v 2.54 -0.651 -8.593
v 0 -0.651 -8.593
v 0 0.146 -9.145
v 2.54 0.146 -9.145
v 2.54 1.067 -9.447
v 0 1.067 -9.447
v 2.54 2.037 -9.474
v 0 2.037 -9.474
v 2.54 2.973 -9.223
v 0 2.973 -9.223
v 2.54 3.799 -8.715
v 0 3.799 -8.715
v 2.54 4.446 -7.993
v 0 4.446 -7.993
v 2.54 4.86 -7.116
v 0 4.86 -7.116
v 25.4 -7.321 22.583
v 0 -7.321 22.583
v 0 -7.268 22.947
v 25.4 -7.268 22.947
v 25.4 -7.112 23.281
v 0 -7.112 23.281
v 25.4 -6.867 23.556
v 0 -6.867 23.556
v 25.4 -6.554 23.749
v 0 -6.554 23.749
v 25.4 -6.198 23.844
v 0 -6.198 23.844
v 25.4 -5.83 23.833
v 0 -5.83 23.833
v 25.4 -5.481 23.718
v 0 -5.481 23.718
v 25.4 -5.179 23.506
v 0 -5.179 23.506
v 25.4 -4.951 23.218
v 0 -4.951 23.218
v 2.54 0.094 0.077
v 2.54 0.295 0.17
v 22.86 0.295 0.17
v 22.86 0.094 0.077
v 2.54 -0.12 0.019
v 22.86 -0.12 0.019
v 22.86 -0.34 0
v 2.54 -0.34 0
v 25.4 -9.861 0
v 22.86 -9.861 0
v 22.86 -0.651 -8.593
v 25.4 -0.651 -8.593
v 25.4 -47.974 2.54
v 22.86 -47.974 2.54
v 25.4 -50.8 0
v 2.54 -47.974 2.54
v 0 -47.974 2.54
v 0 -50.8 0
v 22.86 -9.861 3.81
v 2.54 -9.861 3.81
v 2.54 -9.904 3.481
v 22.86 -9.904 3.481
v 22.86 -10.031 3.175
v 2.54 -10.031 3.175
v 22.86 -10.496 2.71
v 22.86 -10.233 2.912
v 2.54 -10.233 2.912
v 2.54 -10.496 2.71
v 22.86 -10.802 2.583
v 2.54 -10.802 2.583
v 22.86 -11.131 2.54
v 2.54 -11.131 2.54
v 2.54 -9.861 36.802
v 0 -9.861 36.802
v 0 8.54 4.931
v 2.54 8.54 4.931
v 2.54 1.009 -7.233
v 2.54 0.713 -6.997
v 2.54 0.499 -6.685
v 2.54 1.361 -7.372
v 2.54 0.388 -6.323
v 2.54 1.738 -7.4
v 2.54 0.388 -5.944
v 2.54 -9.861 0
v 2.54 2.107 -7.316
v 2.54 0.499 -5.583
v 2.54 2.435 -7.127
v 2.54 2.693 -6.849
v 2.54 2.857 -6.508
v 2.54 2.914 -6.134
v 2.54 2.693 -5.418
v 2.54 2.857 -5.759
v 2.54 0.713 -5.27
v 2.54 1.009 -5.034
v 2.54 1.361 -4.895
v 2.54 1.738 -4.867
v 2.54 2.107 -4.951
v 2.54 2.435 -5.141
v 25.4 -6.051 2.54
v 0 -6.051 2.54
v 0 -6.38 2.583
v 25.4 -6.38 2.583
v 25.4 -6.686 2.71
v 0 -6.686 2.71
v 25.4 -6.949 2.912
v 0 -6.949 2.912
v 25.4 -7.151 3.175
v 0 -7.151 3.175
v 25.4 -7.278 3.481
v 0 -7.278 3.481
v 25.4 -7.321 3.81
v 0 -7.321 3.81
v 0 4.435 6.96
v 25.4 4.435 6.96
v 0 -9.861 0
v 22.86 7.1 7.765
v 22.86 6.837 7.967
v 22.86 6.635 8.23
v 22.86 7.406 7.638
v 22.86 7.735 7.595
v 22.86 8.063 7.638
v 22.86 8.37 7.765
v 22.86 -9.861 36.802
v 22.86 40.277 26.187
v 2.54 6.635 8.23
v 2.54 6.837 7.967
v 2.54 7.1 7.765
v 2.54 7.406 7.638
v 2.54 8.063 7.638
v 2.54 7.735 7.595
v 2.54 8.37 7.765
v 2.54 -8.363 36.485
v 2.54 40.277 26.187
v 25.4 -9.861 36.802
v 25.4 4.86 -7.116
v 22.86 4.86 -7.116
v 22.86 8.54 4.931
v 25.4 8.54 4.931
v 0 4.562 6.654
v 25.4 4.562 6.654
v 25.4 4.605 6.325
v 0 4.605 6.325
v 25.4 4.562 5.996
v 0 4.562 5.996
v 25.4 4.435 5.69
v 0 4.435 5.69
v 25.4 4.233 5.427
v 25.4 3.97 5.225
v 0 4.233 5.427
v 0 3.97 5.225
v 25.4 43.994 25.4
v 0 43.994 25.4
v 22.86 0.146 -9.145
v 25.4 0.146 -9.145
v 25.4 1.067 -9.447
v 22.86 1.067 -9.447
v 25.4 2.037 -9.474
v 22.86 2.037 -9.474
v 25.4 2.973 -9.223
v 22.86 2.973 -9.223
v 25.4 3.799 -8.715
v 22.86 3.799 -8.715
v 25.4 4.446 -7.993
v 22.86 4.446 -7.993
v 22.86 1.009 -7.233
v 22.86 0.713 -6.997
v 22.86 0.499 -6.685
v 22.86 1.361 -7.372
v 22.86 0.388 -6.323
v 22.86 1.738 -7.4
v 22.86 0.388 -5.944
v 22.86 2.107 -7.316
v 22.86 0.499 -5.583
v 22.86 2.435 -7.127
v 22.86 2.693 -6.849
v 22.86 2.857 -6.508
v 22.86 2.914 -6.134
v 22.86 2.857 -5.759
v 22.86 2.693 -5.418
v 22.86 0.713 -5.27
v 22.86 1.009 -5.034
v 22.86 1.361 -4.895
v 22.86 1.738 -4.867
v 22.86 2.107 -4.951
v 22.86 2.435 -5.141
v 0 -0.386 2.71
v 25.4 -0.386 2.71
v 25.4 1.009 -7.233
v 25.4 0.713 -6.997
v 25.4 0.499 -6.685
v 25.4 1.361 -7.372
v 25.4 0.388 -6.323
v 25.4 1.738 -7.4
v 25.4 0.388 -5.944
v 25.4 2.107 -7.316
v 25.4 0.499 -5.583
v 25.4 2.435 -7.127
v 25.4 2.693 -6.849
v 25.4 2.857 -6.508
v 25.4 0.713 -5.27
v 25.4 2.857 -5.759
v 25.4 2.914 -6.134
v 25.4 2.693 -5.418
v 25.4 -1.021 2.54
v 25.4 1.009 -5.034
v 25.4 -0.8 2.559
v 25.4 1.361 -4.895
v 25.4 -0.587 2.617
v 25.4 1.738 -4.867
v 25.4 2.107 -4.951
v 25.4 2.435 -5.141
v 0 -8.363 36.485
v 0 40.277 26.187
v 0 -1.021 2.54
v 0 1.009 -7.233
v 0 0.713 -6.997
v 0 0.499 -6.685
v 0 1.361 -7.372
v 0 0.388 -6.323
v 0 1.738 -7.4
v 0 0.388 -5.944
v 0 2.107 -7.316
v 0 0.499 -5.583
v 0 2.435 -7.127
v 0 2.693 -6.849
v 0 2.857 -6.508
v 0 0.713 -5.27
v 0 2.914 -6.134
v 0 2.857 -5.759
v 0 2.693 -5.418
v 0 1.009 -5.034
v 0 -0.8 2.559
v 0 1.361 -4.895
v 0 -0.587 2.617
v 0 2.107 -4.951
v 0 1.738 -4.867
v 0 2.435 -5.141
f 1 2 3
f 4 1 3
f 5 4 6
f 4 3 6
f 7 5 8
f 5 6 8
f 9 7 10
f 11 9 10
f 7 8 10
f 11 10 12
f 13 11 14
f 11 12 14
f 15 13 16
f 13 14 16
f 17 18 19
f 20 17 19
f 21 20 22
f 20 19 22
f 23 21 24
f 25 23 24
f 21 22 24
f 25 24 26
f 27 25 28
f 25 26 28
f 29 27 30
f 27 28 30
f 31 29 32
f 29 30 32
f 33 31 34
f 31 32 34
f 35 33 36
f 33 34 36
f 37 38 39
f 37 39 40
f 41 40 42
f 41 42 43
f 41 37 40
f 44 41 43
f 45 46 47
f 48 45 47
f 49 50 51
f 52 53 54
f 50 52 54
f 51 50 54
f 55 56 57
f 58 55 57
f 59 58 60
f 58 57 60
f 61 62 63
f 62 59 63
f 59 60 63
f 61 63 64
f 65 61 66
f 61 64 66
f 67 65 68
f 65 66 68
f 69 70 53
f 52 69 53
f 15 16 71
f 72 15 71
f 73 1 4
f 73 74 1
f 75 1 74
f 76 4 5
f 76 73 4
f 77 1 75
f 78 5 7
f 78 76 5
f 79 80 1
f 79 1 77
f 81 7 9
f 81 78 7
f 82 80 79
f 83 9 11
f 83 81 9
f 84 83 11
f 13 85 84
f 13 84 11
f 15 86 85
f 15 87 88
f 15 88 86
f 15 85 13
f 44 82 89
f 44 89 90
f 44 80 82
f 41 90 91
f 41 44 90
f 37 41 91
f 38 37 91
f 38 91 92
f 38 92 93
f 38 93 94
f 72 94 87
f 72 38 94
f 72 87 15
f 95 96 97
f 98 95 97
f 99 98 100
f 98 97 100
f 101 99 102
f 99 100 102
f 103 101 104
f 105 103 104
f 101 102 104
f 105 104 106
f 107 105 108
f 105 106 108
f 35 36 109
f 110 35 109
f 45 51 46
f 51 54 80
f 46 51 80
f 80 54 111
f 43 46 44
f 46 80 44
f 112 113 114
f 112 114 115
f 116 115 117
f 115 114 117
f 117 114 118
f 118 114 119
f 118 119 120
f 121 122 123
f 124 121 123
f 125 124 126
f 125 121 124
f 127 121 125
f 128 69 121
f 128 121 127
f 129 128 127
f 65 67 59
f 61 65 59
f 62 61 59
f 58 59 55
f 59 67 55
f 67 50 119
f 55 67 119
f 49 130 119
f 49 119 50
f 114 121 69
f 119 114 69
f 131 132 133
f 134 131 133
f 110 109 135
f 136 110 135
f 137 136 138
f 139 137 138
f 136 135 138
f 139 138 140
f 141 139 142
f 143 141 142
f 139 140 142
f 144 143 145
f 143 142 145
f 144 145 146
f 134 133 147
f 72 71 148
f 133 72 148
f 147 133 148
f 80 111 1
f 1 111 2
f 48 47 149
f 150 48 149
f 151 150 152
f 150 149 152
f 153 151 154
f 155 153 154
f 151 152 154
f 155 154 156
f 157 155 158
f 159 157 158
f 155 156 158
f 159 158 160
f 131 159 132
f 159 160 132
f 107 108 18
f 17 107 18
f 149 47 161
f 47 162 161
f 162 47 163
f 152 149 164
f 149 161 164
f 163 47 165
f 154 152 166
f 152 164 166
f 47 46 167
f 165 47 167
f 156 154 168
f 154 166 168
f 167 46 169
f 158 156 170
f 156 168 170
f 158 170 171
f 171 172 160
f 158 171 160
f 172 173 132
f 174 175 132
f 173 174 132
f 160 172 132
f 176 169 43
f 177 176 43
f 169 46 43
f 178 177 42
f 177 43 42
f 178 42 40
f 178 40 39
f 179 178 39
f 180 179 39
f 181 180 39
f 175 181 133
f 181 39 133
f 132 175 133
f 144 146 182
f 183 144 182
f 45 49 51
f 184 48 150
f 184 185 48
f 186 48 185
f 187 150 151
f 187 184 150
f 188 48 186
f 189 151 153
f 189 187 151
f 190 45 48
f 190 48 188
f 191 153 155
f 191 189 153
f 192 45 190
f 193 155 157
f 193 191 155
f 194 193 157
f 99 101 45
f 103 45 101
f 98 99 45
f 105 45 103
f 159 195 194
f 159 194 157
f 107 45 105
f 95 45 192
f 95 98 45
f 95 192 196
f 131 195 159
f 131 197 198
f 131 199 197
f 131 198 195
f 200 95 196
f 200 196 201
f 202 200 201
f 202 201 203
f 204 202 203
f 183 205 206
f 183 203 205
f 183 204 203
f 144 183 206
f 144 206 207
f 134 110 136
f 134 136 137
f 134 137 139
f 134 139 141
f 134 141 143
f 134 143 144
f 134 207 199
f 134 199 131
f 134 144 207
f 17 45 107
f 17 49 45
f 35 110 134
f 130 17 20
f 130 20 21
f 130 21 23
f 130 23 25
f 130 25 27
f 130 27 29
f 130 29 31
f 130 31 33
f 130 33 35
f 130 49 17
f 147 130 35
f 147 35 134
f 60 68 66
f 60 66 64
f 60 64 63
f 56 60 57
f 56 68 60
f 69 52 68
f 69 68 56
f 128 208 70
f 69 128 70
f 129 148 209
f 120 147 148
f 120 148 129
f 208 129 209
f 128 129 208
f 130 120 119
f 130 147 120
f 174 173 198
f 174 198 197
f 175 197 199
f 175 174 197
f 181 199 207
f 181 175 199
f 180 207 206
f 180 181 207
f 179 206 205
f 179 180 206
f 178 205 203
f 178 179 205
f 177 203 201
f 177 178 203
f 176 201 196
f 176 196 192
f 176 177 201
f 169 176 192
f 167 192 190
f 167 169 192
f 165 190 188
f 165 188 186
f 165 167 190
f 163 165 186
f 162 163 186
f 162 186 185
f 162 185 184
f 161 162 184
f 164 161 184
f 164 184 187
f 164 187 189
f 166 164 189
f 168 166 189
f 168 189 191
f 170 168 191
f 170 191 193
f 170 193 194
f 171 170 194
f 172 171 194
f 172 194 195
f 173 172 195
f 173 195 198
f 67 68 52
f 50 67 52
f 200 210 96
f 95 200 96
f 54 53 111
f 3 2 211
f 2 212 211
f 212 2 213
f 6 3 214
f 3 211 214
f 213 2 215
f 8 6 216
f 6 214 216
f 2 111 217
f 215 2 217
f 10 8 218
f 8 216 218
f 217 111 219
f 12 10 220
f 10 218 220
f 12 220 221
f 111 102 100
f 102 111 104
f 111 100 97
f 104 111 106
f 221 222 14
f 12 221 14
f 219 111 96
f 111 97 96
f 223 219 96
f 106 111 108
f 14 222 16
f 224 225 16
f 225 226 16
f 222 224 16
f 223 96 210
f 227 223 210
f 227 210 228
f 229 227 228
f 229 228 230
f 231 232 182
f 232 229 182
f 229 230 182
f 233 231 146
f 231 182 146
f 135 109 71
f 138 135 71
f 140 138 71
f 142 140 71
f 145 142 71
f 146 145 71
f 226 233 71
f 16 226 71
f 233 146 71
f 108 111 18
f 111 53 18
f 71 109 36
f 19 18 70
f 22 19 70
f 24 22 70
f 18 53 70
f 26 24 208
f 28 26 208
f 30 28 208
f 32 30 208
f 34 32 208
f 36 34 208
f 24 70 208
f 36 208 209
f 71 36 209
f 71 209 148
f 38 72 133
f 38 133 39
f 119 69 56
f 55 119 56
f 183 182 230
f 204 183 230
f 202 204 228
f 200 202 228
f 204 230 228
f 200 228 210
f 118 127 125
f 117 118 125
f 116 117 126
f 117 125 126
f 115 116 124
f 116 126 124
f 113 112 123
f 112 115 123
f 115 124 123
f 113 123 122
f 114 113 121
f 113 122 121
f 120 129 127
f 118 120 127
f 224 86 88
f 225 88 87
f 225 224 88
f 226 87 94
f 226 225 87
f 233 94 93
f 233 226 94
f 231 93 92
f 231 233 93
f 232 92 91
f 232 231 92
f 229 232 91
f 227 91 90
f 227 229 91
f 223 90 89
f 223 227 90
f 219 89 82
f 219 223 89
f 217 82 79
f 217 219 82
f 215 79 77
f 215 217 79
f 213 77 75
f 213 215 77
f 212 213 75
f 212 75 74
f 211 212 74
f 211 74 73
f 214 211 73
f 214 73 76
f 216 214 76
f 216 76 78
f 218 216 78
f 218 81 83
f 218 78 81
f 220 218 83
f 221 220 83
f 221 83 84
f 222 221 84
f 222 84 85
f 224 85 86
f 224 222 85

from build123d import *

# Parameters (mm, degrees)
F0_R     = 1.27
F1_DEPTH = 25.4
F2_DEPTH = 2.54
F4_DEPTH = 2.54
F8_DEPTH = 20.32


# Not quite as in the source:
# - a feature names something its author has since deleted; it is built from what else it names


with BuildPart() as f1:
    # F0 (on Right) → F1 (new body)
    with BuildSketch(Plane.YZ):
        with BuildLine():
            Line((-50.8, 0), (-9.8610056184, 0))
            Line((-9.8610056184, 0), (-0.6510920475, -8.592966345))
            ThreePointArc((-0.6510920475, -8.592966345), (2.514052834, -9.3825729095), (4.8603454258, -7.1161811248))
            Line((4.8603454258, -7.1161811248), (8.5398813724, 4.9305028092))
            Line((8.5398813724, 4.9305028092), (43.9940905122, 25.4))
            Line((43.9940905122, 25.4), (40.2770972977, 26.1869323345))
            Line((40.2770972977, 26.1869323345), (8.3697336352, 7.7652073348))
            ThreePointArc((8.3697336352, 7.7652073348), (7.4060334479, 7.6383337982), (6.6348813724, 8.2300595976))
            Line((6.6348813724, 8.2300595976), (-9.8610056184, 36.8017739816))
            Line((-9.8610056184, 36.8017739816), (-9.8610056184, 3.81))
            ThreePointArc((-9.8610056184, 3.81), (-10.2329800063, 2.9119743879), (-11.1310056184, 2.54))
            Line((-11.1310056184, 2.54), (-47.9744556178, 2.54))
            Line((-47.9744556178, 2.54), (-50.8, 0))
        make_face()
        with Locations((1.6435009364, -6.1336289969)):
            Circle(F0_R, mode=Mode.SUBTRACT)
        with BuildLine():
            Line((-1.0208864232, 2.54), (-6.0510056184, 2.54))
            ThreePointArc((-6.0510056184, 2.54), (-6.9490312305, 2.9119743879), (-7.3210056184, 3.81))
            Line((-7.3210056184, 3.81), (-7.3210056184, 22.5826604048))
            ThreePointArc((-7.3210056184, 22.5826604048), (-6.3797058057, 23.8093862042), (-4.9511533556, 23.2176604048))
            Line((-4.9511533556, 23.2176604048), (4.4351768468, 6.9600595976))
            ThreePointArc((4.4351768468, 6.9600595976), (4.5620503834, 5.9963594103), (3.970324584, 5.2252073348))
            Line((3.970324584, 5.2252073348), (-0.3858864232, 2.7101477372))
            ThreePointArc((-0.3858864232, 2.7101477372), (-0.6921862359, 2.5832742006), (-1.0208864232, 2.54))
        make_face(mode=Mode.SUBTRACT)
    extrude(amount=F1_DEPTH)

    # F0 (on Right) → F2 (join)
    with BuildSketch(Plane.YZ):
        with BuildLine():
            Line((-9.8610056184, 36.8017739816), (-47.9744556178, 2.54))
            Line((-47.9744556178, 2.54), (-11.1310056184, 2.54))
            ThreePointArc((-11.1310056184, 2.54), (-10.2329800063, 2.9119743879), (-9.8610056184, 3.81))
            Line((-9.8610056184, 3.81), (-9.8610056184, 36.8017739816))
        make_face()
        with BuildLine():
            Line((-8.3631146249, 36.484652376), (-9.8610056184, 36.8017739816))
            Line((-9.8610056184, 36.8017739816), (6.6348813724, 8.2300595976))
            ThreePointArc((6.6348813724, 8.2300595976), (7.4060334479, 7.6383337982), (8.3697336352, 7.7652073348))
            Line((8.3697336352, 7.7652073348), (40.2770972977, 26.1869323345))
            Line((40.2770972977, 26.1869323345), (-8.3631146249, 36.484652376))
        make_face()
    extrude(amount=F2_DEPTH)

    # F3 (on face) → F4 (join)
    with BuildSketch(Plane.YZ.offset(25.4)):
        with BuildLine():
            Line((-9.8610056184, 3.81), (-9.8610056184, 36.8017739816))
            Line((-9.8610056184, 36.8017739816), (-47.9744556178, 2.54))
            Line((-47.9744556178, 2.54), (-11.1310056184, 2.54))
            ThreePointArc((-11.1310056184, 2.54), (-10.2329800063, 2.9119743879), (-9.8610056184, 3.81))
        make_face()
        with BuildLine():
            Line((40.2770972977, 26.1869323345), (-9.8610056184, 36.8017739816))
            Line((-9.8610056184, 36.8017739816), (6.6348813724, 8.2300595976))
            ThreePointArc((6.6348813724, 8.2300595976), (7.4060334479, 7.6383337982), (8.3697336352, 7.7652073348))
            Line((8.3697336352, 7.7652073348), (40.2770972977, 26.1869323345))
        make_face()
    extrude(amount=-F4_DEPTH)

    # F7 (on offset) → F8 (cut)
    with BuildSketch(Plane.YZ.offset(2.54)):
        with BuildLine():
            Line((8.5398813724, 4.9305028092), (0.2947045256, 0.1701477372))
            ThreePointArc((0.2947045256, 0.1701477372), (-0.0115952871, 0.0432742006), (-0.3402954744, 0))
            Line((-0.3402954744, 0), (-9.8610056184, 0))
            Line((-9.8610056184, 0), (-0.6510920475, -8.592966345))
            ThreePointArc((-0.6510920475, -8.592966345), (2.514052834, -9.3825729095), (4.8603454258, -7.1161811248))
            Line((4.8603454258, -7.1161811248), (8.5398813724, 4.9305028092))
        make_face()
    extrude(amount=F8_DEPTH, mode=Mode.SUBTRACT)


solid = f1.part
